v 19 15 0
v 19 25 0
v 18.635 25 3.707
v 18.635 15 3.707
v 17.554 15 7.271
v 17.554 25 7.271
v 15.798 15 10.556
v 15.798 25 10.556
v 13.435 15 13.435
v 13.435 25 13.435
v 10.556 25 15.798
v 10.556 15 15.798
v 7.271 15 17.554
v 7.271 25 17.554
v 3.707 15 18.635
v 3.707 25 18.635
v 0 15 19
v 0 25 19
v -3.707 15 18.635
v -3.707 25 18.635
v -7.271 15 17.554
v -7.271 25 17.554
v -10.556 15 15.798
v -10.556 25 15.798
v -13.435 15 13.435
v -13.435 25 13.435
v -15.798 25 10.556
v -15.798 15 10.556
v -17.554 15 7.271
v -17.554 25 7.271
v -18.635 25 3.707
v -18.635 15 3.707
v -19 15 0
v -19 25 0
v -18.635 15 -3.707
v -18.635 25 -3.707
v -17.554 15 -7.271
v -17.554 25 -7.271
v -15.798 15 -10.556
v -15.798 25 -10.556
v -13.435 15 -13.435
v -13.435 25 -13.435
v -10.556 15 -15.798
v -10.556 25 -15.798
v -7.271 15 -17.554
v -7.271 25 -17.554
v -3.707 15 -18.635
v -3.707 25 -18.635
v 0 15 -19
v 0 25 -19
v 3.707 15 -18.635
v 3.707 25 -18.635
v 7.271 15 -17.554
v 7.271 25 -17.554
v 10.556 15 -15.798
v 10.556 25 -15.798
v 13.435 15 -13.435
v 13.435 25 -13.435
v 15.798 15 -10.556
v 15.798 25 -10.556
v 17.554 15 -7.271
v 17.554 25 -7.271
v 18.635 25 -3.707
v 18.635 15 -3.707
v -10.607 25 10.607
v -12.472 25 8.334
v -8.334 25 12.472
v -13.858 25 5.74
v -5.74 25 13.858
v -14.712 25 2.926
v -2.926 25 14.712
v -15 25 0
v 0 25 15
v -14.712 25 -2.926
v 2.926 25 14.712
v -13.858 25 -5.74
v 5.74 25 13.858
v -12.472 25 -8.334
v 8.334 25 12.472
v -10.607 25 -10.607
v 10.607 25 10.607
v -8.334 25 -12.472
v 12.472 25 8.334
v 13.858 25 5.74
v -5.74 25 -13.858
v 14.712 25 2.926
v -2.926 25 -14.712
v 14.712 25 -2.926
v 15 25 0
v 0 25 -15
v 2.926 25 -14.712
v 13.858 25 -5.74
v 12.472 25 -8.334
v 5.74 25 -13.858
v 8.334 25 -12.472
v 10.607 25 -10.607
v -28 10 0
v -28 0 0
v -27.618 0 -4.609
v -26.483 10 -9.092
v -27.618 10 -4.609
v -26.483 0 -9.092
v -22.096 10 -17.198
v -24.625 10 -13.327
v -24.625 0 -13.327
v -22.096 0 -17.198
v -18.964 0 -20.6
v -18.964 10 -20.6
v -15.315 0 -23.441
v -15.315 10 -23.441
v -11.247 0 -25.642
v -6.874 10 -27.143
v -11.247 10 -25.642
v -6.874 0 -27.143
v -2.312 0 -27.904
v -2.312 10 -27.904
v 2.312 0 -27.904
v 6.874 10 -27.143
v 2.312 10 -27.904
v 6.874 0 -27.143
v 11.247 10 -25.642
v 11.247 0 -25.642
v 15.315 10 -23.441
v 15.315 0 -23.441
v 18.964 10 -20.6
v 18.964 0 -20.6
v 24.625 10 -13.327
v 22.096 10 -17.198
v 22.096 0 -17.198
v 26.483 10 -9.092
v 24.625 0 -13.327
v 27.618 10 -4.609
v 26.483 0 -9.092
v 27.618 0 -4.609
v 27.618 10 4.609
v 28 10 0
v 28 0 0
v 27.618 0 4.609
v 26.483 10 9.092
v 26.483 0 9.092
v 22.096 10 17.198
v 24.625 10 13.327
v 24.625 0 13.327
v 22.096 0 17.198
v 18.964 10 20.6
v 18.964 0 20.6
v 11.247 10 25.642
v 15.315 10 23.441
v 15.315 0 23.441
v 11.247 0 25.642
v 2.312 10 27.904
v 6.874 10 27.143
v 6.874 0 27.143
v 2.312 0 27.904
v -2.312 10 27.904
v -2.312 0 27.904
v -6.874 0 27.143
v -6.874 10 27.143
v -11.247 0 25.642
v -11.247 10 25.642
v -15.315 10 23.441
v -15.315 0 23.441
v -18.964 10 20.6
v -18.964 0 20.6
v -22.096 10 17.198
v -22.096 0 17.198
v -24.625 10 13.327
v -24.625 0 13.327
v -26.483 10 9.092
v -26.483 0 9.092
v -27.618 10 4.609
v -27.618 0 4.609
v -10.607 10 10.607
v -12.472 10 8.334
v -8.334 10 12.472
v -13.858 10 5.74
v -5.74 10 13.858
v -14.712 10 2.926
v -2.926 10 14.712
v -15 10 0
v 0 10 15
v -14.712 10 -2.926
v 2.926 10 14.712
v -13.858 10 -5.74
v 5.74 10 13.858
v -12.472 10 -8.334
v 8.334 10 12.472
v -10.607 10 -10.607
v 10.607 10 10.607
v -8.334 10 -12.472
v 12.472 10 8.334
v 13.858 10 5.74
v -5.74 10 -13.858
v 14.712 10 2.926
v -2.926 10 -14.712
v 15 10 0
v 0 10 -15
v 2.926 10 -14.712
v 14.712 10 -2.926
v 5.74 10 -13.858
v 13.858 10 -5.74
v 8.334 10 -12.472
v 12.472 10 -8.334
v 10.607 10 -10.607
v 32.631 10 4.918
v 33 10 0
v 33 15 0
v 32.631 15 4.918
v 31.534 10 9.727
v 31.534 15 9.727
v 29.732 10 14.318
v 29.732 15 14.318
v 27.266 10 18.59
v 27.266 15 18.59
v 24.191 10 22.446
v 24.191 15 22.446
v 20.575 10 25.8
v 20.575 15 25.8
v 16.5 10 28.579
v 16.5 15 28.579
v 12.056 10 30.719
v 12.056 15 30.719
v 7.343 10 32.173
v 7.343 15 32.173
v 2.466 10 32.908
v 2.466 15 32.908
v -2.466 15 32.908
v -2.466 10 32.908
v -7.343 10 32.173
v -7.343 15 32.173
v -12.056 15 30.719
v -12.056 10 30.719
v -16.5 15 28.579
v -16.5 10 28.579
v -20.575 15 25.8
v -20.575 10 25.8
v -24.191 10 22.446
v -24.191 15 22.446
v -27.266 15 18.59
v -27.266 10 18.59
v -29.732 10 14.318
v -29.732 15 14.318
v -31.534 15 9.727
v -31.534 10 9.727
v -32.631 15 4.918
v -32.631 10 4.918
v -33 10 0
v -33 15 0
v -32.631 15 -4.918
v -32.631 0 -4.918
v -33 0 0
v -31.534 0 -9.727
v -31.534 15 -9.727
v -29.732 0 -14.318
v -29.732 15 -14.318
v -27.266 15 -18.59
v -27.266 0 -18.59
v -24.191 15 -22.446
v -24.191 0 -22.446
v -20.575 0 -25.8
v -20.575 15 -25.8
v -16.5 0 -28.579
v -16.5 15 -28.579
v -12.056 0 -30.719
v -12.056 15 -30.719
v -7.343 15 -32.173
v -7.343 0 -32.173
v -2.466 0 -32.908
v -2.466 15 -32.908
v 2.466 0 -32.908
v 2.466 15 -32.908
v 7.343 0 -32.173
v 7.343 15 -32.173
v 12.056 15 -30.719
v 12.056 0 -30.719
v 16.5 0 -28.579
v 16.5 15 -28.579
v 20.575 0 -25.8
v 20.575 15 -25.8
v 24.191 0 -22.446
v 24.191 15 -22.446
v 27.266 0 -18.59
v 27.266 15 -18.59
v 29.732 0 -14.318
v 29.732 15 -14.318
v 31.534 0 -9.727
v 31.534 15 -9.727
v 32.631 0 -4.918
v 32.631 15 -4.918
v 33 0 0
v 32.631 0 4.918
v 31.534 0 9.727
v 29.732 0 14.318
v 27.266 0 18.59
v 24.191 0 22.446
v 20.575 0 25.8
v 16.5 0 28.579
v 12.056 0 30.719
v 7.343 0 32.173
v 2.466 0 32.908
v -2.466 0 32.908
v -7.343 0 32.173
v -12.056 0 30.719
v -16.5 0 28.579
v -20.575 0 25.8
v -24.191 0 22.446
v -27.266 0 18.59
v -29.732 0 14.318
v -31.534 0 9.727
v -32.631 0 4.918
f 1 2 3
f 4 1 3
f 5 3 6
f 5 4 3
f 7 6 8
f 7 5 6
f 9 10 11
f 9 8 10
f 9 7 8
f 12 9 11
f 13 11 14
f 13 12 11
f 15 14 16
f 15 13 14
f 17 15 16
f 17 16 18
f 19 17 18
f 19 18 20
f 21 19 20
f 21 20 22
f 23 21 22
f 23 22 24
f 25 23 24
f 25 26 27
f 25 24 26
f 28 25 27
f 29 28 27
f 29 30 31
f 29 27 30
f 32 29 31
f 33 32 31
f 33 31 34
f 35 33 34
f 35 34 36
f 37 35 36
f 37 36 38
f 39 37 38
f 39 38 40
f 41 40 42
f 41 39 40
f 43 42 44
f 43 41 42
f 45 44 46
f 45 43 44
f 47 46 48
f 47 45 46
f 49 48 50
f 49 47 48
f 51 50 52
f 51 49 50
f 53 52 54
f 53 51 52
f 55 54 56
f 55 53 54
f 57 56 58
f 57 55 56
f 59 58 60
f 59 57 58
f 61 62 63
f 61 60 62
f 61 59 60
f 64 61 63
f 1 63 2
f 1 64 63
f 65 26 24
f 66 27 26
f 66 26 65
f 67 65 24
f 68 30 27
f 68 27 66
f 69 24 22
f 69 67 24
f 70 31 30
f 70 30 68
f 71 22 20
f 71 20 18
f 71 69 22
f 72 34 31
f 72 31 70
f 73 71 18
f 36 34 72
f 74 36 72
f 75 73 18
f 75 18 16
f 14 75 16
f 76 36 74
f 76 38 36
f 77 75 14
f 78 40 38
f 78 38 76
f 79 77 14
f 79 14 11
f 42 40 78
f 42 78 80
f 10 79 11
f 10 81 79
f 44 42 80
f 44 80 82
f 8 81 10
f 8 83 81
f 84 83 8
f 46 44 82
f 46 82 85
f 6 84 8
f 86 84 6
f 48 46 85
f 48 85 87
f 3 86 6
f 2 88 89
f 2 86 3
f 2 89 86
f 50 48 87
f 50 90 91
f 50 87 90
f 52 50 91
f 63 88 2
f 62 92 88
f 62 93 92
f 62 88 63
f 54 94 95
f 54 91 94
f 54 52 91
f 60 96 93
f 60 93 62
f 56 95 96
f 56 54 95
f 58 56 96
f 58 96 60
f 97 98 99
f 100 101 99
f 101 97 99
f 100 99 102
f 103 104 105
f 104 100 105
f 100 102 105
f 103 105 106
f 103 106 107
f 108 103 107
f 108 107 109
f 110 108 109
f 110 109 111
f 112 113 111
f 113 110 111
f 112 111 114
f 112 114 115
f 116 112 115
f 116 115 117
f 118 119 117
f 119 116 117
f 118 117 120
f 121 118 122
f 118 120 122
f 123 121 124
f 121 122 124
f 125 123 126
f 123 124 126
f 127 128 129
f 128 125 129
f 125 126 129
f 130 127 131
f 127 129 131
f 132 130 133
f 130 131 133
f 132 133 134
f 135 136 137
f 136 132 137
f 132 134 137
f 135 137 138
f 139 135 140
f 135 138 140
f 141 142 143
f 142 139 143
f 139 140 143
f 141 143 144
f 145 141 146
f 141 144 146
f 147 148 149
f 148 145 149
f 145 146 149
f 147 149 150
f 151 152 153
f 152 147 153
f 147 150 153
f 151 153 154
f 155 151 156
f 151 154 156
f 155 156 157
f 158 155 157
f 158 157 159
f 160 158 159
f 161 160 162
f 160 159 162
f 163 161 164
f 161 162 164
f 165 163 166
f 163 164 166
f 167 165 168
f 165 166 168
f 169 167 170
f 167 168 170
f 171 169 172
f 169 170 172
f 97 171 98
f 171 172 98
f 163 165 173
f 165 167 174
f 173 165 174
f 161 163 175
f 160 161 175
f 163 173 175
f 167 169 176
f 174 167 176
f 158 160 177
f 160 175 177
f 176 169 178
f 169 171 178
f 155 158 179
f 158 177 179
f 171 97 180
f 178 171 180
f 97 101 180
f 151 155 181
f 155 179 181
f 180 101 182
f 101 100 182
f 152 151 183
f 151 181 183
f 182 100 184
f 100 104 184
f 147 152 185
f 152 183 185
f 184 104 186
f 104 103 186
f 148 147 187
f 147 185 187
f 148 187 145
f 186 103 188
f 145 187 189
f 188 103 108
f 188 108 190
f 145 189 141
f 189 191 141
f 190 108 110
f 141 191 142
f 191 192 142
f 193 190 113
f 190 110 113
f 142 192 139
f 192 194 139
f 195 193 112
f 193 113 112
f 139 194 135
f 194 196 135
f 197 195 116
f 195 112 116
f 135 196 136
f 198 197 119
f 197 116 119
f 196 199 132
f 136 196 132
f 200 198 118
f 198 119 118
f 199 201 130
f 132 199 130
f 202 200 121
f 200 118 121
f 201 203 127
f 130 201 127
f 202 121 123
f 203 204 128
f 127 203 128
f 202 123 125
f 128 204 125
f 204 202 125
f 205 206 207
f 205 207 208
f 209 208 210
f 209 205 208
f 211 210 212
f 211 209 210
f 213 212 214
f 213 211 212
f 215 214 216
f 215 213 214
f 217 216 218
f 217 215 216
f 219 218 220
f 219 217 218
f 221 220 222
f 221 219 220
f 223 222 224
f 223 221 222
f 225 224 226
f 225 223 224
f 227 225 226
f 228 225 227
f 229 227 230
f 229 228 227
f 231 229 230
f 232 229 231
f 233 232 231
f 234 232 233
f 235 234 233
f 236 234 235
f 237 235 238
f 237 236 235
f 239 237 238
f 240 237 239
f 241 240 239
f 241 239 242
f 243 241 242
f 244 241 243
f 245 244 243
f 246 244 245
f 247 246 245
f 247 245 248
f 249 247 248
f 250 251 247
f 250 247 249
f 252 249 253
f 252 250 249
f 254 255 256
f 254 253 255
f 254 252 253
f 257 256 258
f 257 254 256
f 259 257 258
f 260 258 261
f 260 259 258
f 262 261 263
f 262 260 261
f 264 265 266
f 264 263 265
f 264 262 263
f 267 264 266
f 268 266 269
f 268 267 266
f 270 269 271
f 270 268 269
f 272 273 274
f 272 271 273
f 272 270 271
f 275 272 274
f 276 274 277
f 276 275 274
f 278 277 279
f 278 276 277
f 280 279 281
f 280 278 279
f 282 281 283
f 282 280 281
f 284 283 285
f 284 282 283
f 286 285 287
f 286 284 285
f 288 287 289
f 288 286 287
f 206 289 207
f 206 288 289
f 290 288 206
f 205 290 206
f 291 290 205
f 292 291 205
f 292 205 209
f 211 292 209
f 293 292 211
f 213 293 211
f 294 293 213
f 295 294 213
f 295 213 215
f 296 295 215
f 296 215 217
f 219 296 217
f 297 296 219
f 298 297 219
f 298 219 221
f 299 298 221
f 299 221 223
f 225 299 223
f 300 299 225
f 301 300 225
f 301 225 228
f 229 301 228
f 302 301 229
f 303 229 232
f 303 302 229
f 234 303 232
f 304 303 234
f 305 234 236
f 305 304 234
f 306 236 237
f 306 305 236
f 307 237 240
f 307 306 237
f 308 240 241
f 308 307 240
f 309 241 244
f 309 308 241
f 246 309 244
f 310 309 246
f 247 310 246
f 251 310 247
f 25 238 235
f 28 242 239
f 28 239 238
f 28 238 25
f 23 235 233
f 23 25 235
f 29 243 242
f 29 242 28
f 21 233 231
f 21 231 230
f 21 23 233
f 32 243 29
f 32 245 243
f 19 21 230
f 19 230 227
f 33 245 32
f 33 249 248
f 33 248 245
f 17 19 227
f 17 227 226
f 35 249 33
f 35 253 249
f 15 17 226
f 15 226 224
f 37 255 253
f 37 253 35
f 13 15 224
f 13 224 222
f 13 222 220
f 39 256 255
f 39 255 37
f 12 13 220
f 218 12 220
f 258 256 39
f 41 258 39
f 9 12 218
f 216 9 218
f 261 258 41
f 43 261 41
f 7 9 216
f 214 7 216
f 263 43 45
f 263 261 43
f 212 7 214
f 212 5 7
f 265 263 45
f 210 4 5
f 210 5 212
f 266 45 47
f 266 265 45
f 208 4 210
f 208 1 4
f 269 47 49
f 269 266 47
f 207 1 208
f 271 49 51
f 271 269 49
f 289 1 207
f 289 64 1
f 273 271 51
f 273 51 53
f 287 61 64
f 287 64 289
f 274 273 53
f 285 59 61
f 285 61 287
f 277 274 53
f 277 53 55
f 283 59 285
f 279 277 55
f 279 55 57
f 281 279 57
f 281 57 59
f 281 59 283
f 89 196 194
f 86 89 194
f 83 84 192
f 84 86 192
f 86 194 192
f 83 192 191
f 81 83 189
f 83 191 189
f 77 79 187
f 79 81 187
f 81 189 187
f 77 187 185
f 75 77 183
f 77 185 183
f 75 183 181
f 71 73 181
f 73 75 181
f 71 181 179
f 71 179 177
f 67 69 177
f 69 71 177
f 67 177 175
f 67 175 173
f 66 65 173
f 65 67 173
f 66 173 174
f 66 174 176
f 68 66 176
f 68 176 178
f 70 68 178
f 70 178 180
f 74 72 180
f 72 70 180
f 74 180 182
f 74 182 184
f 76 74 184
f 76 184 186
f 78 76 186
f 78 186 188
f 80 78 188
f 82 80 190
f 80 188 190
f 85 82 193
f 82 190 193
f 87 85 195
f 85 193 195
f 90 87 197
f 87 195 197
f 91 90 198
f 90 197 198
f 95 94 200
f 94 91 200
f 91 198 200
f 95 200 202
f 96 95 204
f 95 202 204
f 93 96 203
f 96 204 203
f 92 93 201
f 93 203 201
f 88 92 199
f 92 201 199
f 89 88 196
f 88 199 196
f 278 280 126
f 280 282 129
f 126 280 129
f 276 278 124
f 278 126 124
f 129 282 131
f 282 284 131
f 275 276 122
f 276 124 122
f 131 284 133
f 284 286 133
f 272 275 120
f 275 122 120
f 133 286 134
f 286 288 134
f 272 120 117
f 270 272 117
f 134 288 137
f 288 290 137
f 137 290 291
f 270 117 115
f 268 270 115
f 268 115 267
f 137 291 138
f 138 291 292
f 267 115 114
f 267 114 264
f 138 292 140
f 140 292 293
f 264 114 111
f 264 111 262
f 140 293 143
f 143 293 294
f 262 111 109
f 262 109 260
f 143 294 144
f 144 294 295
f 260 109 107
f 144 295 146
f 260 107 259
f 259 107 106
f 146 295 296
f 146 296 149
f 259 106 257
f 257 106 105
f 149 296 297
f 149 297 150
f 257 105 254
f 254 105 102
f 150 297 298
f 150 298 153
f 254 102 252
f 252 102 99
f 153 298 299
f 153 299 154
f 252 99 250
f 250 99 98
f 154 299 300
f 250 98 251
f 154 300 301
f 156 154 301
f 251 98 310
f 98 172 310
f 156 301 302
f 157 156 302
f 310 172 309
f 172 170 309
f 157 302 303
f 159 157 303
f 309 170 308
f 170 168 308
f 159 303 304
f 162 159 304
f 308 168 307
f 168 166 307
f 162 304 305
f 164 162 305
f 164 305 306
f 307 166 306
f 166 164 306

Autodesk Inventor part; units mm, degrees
ref_plane "YZ Plane" through (0, 0, 0) normal (1, 0, 0) x (0, 1, 0)
ref_plane "XZ Plane" through (0, 0, 0) normal (0, 1, 0) x (-1, 0, 0)
ref_plane "XY Plane" through (0, 0, 0) normal (0, 0, 1) x (1, 0, 0)
sketch "Sketch1" plane through (0, 0, 0) normal (0, 1, 0) x (-1, 0, 0)
  circle A0 centre (0, 0) radius 28
  circle A1 centre (0, 0) radius 33
  dimension "d0" = 56
  dimension "d1" = 66
extrude "Extrusion1" add sketch "Sketch1" along normal blind 10
sketch "Sketch2" plane through (0, 10, 0) normal (0, 1, 0) x (1, 0, 0)
  circle A0 centre (0, 0) radius 15
  circle A1 centre (0, 0) radius 33 projected
  dimension "d4" = 30
extrude "Extrusion2" add sketch "Sketch2" along normal blind 5
sketch "Sketch3" plane through (0, 15, 0) normal (0, 1, 0) x (1, 0, 0)
  circle A0 centre (0, 0) radius 15
  circle A1 centre (0, 0) radius 19
  dimension "d7" = 38
  dimension "d8" = 30
extrude "Extrusion3" add sketch "Sketch3" along normal blind 10
properties part number "bigbearingcup" material "Steel"
